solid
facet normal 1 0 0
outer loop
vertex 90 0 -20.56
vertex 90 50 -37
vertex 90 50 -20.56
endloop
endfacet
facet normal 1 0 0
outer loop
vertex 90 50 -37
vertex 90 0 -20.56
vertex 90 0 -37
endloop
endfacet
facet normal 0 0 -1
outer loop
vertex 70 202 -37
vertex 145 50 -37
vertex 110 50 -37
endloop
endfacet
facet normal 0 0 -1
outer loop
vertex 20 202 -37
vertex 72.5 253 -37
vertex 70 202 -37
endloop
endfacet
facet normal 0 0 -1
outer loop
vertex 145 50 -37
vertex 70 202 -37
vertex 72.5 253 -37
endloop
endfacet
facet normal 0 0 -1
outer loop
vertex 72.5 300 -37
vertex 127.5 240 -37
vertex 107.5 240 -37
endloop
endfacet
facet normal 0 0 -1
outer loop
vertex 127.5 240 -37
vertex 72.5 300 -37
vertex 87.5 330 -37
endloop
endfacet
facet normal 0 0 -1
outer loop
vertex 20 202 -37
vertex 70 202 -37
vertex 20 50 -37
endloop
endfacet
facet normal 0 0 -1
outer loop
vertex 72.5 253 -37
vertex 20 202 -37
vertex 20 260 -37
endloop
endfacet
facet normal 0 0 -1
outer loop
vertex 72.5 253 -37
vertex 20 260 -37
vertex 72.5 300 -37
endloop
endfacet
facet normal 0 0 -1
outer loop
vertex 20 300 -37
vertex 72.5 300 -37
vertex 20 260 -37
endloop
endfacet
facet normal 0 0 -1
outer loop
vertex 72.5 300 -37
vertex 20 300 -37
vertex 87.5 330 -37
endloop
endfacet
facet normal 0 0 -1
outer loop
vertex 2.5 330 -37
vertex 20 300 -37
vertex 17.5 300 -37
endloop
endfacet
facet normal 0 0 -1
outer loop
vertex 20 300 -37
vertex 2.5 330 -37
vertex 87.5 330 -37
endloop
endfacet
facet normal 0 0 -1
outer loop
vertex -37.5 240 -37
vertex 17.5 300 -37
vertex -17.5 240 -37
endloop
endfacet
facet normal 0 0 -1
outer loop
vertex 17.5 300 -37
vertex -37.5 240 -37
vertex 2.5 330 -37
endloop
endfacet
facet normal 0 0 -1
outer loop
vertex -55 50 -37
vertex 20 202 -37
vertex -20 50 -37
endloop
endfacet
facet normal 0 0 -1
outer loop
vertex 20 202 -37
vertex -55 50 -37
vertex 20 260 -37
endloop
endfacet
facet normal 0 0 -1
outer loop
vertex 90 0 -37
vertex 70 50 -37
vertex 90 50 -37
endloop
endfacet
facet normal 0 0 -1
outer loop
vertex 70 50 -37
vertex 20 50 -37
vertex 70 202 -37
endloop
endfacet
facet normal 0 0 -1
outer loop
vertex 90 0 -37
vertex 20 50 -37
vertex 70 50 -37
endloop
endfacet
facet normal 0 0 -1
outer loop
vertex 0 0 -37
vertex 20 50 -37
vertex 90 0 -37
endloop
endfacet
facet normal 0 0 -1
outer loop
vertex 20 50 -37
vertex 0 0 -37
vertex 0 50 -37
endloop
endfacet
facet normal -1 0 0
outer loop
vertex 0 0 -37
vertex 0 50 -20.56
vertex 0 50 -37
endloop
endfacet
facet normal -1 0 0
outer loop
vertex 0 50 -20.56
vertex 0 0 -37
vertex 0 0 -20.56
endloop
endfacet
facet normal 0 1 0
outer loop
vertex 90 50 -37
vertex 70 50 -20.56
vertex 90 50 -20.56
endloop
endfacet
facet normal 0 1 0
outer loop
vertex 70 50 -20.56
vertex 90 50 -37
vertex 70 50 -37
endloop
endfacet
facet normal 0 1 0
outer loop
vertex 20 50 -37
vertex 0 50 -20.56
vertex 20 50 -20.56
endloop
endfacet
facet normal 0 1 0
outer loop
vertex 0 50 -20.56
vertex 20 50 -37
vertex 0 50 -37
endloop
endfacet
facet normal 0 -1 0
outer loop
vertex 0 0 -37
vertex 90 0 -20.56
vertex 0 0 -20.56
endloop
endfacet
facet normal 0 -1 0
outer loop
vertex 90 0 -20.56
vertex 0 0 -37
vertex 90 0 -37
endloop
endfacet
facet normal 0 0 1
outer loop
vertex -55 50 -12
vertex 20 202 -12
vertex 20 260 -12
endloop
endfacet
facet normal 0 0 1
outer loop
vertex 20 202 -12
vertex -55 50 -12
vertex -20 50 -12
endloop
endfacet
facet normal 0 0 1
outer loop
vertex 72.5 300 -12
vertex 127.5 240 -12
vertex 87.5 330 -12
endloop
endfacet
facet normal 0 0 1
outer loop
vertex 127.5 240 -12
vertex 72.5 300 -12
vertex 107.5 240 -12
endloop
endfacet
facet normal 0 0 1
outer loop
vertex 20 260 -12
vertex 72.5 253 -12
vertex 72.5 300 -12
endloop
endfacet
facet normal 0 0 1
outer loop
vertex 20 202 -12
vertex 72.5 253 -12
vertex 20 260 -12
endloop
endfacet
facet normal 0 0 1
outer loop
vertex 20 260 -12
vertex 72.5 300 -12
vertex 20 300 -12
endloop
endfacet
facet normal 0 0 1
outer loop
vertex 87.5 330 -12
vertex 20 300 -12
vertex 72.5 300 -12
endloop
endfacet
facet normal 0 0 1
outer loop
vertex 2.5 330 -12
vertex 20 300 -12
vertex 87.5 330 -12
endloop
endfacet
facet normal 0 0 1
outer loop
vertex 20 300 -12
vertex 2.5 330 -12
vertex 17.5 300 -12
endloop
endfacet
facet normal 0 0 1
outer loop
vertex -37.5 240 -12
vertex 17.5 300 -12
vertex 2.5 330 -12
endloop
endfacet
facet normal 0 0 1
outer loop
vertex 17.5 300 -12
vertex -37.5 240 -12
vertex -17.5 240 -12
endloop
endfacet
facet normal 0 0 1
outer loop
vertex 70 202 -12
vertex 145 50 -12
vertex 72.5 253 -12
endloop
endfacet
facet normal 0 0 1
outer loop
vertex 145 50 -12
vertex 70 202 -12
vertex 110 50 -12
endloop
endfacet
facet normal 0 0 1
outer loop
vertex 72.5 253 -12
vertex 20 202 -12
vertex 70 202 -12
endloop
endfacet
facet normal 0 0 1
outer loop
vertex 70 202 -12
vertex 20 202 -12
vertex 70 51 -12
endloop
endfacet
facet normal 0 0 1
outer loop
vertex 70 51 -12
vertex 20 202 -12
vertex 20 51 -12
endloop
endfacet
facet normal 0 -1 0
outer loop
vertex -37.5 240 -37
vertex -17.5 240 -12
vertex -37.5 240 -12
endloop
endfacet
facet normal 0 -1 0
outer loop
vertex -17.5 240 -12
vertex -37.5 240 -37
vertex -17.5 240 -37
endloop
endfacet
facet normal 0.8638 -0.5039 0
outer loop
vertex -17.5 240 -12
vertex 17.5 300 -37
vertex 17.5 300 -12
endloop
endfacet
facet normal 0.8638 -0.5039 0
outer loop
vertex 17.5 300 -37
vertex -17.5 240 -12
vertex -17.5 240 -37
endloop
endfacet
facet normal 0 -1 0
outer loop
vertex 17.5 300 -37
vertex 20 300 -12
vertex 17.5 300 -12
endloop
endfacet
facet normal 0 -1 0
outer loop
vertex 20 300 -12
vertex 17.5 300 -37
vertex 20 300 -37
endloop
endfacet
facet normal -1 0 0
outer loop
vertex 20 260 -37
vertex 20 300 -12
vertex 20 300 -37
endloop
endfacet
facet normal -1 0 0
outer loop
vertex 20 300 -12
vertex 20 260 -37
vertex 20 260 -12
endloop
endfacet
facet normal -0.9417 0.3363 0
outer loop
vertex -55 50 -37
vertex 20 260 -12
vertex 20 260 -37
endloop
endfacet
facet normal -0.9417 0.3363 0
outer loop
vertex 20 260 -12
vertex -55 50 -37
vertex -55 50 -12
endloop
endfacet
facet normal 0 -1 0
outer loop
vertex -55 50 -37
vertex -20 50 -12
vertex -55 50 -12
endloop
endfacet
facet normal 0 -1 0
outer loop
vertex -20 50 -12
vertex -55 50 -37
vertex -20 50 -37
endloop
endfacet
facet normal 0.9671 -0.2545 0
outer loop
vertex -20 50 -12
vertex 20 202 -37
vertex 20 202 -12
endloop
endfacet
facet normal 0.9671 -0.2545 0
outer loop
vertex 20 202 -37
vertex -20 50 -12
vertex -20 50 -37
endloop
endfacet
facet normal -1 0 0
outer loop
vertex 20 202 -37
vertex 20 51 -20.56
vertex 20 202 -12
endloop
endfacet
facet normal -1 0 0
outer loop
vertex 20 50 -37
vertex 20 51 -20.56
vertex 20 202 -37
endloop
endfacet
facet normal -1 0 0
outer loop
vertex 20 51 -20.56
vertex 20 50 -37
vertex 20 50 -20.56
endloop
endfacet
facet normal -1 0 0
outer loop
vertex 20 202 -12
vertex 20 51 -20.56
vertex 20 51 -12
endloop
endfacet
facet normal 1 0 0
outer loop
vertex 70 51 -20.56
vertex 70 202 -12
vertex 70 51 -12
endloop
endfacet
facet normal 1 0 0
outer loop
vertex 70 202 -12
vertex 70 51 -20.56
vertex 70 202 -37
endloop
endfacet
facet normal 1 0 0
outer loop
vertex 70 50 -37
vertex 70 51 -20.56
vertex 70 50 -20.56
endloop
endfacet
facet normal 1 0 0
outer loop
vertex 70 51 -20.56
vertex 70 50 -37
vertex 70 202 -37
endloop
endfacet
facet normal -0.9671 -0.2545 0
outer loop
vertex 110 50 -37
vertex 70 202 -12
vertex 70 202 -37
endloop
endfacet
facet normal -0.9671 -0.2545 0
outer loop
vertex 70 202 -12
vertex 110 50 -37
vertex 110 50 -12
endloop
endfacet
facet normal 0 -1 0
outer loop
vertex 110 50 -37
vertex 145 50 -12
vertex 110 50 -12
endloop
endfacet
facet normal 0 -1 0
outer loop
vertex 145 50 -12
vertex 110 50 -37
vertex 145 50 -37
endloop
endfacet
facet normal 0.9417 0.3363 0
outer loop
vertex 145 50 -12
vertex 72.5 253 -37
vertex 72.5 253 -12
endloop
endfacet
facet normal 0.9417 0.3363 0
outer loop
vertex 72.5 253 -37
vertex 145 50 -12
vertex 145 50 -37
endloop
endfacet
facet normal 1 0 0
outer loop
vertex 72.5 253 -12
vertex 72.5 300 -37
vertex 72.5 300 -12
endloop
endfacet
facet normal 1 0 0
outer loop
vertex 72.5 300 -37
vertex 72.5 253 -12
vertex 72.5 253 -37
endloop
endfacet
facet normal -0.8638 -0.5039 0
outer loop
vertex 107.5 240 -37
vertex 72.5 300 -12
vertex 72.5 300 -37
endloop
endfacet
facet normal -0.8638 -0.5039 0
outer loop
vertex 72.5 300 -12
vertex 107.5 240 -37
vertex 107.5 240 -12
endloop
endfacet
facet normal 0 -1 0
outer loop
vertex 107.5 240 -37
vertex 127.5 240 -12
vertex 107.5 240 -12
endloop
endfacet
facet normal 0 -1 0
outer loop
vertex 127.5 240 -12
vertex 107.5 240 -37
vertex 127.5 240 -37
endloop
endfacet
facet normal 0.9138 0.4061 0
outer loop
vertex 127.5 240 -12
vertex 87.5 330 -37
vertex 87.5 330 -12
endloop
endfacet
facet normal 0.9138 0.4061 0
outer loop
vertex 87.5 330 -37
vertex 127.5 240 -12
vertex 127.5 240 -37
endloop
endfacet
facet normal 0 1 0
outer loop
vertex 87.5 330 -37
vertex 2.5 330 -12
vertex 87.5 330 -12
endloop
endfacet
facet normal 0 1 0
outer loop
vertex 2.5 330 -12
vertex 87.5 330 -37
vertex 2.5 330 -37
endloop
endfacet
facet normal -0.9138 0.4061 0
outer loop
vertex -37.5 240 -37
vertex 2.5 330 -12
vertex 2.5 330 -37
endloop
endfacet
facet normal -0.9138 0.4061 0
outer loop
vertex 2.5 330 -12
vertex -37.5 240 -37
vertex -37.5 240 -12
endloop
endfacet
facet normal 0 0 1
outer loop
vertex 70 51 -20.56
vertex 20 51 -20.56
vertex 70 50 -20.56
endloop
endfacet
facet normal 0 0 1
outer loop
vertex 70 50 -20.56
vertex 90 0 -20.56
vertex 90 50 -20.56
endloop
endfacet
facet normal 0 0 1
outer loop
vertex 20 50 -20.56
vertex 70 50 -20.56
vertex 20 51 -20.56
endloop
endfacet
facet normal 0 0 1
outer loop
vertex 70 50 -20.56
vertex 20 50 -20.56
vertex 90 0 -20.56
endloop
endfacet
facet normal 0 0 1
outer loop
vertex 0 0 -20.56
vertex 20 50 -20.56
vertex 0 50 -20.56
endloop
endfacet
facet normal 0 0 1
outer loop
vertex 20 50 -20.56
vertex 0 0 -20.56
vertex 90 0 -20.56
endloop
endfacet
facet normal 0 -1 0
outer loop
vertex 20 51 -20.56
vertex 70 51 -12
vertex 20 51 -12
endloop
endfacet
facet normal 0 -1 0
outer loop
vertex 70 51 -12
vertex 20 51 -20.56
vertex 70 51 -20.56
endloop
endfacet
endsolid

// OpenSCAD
/*
    Speederbike outrigger mid brace
*/

TOLERANCE = 2;
MIN_WALL_THICKNESS = 10;

LENGTH = 90;//304.8;                 // 12"
WIDTH = 50;
HEIGHT = 75; //25.4;

TRIANGLE_LENGTH = 230;
TRIANGLE_WIDTH = 280;

PIPE_OD = 25; //33.56;                // 1" PVC measured OD, not even close to 1"
PIPE_INSIDE_SPACING = 234.95;   // 9.25"
TOP_TUBE_DIAMETER = 22.61;
TOP_TUBE_SLOT = 56; //54.19;
TOP_TUBE_GAP = 15;
BOLT_DIAMETER = 8;              // slightly larger than 1/4"

$fn=50;

difference(){
    
    union(){
        // clamp
        translate([0,0,-(PIPE_OD+TOLERANCE)-MIN_WALL_THICKNESS]){
            cube([LENGTH,WIDTH,HEIGHT]);
        }
        
        // triangle thing
        translate([(LENGTH/2)-(50/2),WIDTH,-PIPE_OD-MIN_WALL_THICKNESS-TOLERANCE]){
            
            linear_extrude(25){
            // core
            #polygon([[0,0],[0,280],[50,280],[50,0]]);
            
            // bottom leaf
            translate([(-200/2)+(50/2),0,0]){
                difference(){
                    polygon([[0,0],[(200/2),280],[200,0]]);
                    translate([35,0,0]){
                        polygon([[0,0],[50,190],[50,0]]);
                    };
                    translate([200-35-50,0,0]){
                        polygon([[0,0],[0,190],[50,0]]);
                    }
                }
            }
            
            // top leaf
            translate([-((40+85+40)/2)+(50/2),190,0]){
                difference(){
                    polygon([[0,0],[40,90],[85+40,90],[40+85+40,0]]);
                    translate([20,0,0]){
                        polygon([[0,0],[35,60],[40,60],[40,0]]);
                    }
                    translate([(40+85+40)-20-35,0,0]){
                        polygon([[0,0],[0,60],[35,0]]);
                    }
                }
            }
            }
        }
    }
    
    // pipe holders
    translate([(LENGTH/2)-(PIPE_INSIDE_SPACING/2),-1,-(PIPE_OD+TOLERANCE)/2]){
        rotate([-90,0,0]){
            cylinder(r=(PIPE_OD+TOLERANCE)/2,h=WIDTH+2);            
        }
        translate([-(PIPE_OD+TOLERANCE)/2,0,0]){
            cube([PIPE_OD+TOLERANCE,WIDTH+2,HEIGHT]);
        }
    
        // bolt holes
        translate([-PIPE_OD*0.80,WIDTH/4,-PIPE_OD]){
            cylinder(r=BOLT_DIAMETER/2,h=HEIGHT+2);
        }
        translate([PIPE_OD,WIDTH/4,-PIPE_OD]){
            cylinder(r=BOLT_DIAMETER/2,h=HEIGHT+2);
        }
        translate([-PIPE_OD*0.80,WIDTH-(WIDTH/4),-PIPE_OD]){
            cylinder(r=BOLT_DIAMETER/2,h=HEIGHT+2);
        }
        translate([PIPE_OD,WIDTH-(WIDTH/4),-PIPE_OD]){
            cylinder(r=BOLT_DIAMETER/2,h=HEIGHT+2);
        }
    }
    translate([(LENGTH/2)+(PIPE_INSIDE_SPACING/2),-1,-(PIPE_OD+TOLERANCE)/2]){
        rotate([-90,0,0]){
            cylinder(r=(PIPE_OD+TOLERANCE)/2,h=WIDTH+2);
        }
        translate([-(PIPE_OD+TOLERANCE)/2,0,0]){
            cube([PIPE_OD+TOLERANCE,WIDTH+2,HEIGHT]);
        }
        
        // bolt holes
        translate([-PIPE_OD,WIDTH/4,-PIPE_OD]){
            cylinder(r=BOLT_DIAMETER/2,h=HEIGHT+2);
        }
        translate([PIPE_OD*0.80,WIDTH/4,-PIPE_OD]){
            cylinder(r=BOLT_DIAMETER/2,h=HEIGHT+2);
        }
        translate([-PIPE_OD,WIDTH-(WIDTH/4),-PIPE_OD]){
            cylinder(r=BOLT_DIAMETER/2,h=HEIGHT+2);
        }
        translate([PIPE_OD*0.80,WIDTH-(WIDTH/4),-PIPE_OD]){
            cylinder(r=BOLT_DIAMETER/2,h=HEIGHT+2);
        }
    }
    
    /*
    // top-tube slot
    tt_min = TOP_TUBE_SLOT;    // TOP_TUBE_SLOT
    tt_max = 65;    // fresh measurement
    
    translate([(LENGTH/2)-(tt_max/2),-1,-1]){
        //cube([TOP_TUBE_SLOT,WIDTH+2,TOP_TUBE_DIAMETER+1]);
        
        linear_extrude(TOP_TUBE_DIAMETER+1){
            polygon([[0,0],[(tt_max-tt_min)/2,WIDTH+2],[tt_max-((tt_max-tt_min))/2,WIDTH+2],[tt_max,0]]);
        }
        
        // bolt holes
        translate([-tt_max/4,WIDTH/2,-TOP_TUBE_DIAMETER]){
            cylinder(r=BOLT_DIAMETER/2,h=HEIGHT);
        }
        translate([tt_max+(tt_max/4),WIDTH/2,-TOP_TUBE_DIAMETER]){
            cylinder(r=BOLT_DIAMETER/2,h=HEIGHT);
        }
    }
    
    // cut-out excess underneath
    translate([LENGTH/2,-1,-((PIPE_OD+TOLERANCE)-MIN_WALL_THICKNESS)-LENGTH/2.45]){
        rotate([-90,0,0]){
            cylinder(r=LENGTH/2,h=WIDTH+2);
        }
    }
    */
    
    // cut-out excess above pipes
    translate([-1,-1,-20.56]){
        cube([LENGTH+TOLERANCE,WIDTH+2,HEIGHT]);
    }
}
